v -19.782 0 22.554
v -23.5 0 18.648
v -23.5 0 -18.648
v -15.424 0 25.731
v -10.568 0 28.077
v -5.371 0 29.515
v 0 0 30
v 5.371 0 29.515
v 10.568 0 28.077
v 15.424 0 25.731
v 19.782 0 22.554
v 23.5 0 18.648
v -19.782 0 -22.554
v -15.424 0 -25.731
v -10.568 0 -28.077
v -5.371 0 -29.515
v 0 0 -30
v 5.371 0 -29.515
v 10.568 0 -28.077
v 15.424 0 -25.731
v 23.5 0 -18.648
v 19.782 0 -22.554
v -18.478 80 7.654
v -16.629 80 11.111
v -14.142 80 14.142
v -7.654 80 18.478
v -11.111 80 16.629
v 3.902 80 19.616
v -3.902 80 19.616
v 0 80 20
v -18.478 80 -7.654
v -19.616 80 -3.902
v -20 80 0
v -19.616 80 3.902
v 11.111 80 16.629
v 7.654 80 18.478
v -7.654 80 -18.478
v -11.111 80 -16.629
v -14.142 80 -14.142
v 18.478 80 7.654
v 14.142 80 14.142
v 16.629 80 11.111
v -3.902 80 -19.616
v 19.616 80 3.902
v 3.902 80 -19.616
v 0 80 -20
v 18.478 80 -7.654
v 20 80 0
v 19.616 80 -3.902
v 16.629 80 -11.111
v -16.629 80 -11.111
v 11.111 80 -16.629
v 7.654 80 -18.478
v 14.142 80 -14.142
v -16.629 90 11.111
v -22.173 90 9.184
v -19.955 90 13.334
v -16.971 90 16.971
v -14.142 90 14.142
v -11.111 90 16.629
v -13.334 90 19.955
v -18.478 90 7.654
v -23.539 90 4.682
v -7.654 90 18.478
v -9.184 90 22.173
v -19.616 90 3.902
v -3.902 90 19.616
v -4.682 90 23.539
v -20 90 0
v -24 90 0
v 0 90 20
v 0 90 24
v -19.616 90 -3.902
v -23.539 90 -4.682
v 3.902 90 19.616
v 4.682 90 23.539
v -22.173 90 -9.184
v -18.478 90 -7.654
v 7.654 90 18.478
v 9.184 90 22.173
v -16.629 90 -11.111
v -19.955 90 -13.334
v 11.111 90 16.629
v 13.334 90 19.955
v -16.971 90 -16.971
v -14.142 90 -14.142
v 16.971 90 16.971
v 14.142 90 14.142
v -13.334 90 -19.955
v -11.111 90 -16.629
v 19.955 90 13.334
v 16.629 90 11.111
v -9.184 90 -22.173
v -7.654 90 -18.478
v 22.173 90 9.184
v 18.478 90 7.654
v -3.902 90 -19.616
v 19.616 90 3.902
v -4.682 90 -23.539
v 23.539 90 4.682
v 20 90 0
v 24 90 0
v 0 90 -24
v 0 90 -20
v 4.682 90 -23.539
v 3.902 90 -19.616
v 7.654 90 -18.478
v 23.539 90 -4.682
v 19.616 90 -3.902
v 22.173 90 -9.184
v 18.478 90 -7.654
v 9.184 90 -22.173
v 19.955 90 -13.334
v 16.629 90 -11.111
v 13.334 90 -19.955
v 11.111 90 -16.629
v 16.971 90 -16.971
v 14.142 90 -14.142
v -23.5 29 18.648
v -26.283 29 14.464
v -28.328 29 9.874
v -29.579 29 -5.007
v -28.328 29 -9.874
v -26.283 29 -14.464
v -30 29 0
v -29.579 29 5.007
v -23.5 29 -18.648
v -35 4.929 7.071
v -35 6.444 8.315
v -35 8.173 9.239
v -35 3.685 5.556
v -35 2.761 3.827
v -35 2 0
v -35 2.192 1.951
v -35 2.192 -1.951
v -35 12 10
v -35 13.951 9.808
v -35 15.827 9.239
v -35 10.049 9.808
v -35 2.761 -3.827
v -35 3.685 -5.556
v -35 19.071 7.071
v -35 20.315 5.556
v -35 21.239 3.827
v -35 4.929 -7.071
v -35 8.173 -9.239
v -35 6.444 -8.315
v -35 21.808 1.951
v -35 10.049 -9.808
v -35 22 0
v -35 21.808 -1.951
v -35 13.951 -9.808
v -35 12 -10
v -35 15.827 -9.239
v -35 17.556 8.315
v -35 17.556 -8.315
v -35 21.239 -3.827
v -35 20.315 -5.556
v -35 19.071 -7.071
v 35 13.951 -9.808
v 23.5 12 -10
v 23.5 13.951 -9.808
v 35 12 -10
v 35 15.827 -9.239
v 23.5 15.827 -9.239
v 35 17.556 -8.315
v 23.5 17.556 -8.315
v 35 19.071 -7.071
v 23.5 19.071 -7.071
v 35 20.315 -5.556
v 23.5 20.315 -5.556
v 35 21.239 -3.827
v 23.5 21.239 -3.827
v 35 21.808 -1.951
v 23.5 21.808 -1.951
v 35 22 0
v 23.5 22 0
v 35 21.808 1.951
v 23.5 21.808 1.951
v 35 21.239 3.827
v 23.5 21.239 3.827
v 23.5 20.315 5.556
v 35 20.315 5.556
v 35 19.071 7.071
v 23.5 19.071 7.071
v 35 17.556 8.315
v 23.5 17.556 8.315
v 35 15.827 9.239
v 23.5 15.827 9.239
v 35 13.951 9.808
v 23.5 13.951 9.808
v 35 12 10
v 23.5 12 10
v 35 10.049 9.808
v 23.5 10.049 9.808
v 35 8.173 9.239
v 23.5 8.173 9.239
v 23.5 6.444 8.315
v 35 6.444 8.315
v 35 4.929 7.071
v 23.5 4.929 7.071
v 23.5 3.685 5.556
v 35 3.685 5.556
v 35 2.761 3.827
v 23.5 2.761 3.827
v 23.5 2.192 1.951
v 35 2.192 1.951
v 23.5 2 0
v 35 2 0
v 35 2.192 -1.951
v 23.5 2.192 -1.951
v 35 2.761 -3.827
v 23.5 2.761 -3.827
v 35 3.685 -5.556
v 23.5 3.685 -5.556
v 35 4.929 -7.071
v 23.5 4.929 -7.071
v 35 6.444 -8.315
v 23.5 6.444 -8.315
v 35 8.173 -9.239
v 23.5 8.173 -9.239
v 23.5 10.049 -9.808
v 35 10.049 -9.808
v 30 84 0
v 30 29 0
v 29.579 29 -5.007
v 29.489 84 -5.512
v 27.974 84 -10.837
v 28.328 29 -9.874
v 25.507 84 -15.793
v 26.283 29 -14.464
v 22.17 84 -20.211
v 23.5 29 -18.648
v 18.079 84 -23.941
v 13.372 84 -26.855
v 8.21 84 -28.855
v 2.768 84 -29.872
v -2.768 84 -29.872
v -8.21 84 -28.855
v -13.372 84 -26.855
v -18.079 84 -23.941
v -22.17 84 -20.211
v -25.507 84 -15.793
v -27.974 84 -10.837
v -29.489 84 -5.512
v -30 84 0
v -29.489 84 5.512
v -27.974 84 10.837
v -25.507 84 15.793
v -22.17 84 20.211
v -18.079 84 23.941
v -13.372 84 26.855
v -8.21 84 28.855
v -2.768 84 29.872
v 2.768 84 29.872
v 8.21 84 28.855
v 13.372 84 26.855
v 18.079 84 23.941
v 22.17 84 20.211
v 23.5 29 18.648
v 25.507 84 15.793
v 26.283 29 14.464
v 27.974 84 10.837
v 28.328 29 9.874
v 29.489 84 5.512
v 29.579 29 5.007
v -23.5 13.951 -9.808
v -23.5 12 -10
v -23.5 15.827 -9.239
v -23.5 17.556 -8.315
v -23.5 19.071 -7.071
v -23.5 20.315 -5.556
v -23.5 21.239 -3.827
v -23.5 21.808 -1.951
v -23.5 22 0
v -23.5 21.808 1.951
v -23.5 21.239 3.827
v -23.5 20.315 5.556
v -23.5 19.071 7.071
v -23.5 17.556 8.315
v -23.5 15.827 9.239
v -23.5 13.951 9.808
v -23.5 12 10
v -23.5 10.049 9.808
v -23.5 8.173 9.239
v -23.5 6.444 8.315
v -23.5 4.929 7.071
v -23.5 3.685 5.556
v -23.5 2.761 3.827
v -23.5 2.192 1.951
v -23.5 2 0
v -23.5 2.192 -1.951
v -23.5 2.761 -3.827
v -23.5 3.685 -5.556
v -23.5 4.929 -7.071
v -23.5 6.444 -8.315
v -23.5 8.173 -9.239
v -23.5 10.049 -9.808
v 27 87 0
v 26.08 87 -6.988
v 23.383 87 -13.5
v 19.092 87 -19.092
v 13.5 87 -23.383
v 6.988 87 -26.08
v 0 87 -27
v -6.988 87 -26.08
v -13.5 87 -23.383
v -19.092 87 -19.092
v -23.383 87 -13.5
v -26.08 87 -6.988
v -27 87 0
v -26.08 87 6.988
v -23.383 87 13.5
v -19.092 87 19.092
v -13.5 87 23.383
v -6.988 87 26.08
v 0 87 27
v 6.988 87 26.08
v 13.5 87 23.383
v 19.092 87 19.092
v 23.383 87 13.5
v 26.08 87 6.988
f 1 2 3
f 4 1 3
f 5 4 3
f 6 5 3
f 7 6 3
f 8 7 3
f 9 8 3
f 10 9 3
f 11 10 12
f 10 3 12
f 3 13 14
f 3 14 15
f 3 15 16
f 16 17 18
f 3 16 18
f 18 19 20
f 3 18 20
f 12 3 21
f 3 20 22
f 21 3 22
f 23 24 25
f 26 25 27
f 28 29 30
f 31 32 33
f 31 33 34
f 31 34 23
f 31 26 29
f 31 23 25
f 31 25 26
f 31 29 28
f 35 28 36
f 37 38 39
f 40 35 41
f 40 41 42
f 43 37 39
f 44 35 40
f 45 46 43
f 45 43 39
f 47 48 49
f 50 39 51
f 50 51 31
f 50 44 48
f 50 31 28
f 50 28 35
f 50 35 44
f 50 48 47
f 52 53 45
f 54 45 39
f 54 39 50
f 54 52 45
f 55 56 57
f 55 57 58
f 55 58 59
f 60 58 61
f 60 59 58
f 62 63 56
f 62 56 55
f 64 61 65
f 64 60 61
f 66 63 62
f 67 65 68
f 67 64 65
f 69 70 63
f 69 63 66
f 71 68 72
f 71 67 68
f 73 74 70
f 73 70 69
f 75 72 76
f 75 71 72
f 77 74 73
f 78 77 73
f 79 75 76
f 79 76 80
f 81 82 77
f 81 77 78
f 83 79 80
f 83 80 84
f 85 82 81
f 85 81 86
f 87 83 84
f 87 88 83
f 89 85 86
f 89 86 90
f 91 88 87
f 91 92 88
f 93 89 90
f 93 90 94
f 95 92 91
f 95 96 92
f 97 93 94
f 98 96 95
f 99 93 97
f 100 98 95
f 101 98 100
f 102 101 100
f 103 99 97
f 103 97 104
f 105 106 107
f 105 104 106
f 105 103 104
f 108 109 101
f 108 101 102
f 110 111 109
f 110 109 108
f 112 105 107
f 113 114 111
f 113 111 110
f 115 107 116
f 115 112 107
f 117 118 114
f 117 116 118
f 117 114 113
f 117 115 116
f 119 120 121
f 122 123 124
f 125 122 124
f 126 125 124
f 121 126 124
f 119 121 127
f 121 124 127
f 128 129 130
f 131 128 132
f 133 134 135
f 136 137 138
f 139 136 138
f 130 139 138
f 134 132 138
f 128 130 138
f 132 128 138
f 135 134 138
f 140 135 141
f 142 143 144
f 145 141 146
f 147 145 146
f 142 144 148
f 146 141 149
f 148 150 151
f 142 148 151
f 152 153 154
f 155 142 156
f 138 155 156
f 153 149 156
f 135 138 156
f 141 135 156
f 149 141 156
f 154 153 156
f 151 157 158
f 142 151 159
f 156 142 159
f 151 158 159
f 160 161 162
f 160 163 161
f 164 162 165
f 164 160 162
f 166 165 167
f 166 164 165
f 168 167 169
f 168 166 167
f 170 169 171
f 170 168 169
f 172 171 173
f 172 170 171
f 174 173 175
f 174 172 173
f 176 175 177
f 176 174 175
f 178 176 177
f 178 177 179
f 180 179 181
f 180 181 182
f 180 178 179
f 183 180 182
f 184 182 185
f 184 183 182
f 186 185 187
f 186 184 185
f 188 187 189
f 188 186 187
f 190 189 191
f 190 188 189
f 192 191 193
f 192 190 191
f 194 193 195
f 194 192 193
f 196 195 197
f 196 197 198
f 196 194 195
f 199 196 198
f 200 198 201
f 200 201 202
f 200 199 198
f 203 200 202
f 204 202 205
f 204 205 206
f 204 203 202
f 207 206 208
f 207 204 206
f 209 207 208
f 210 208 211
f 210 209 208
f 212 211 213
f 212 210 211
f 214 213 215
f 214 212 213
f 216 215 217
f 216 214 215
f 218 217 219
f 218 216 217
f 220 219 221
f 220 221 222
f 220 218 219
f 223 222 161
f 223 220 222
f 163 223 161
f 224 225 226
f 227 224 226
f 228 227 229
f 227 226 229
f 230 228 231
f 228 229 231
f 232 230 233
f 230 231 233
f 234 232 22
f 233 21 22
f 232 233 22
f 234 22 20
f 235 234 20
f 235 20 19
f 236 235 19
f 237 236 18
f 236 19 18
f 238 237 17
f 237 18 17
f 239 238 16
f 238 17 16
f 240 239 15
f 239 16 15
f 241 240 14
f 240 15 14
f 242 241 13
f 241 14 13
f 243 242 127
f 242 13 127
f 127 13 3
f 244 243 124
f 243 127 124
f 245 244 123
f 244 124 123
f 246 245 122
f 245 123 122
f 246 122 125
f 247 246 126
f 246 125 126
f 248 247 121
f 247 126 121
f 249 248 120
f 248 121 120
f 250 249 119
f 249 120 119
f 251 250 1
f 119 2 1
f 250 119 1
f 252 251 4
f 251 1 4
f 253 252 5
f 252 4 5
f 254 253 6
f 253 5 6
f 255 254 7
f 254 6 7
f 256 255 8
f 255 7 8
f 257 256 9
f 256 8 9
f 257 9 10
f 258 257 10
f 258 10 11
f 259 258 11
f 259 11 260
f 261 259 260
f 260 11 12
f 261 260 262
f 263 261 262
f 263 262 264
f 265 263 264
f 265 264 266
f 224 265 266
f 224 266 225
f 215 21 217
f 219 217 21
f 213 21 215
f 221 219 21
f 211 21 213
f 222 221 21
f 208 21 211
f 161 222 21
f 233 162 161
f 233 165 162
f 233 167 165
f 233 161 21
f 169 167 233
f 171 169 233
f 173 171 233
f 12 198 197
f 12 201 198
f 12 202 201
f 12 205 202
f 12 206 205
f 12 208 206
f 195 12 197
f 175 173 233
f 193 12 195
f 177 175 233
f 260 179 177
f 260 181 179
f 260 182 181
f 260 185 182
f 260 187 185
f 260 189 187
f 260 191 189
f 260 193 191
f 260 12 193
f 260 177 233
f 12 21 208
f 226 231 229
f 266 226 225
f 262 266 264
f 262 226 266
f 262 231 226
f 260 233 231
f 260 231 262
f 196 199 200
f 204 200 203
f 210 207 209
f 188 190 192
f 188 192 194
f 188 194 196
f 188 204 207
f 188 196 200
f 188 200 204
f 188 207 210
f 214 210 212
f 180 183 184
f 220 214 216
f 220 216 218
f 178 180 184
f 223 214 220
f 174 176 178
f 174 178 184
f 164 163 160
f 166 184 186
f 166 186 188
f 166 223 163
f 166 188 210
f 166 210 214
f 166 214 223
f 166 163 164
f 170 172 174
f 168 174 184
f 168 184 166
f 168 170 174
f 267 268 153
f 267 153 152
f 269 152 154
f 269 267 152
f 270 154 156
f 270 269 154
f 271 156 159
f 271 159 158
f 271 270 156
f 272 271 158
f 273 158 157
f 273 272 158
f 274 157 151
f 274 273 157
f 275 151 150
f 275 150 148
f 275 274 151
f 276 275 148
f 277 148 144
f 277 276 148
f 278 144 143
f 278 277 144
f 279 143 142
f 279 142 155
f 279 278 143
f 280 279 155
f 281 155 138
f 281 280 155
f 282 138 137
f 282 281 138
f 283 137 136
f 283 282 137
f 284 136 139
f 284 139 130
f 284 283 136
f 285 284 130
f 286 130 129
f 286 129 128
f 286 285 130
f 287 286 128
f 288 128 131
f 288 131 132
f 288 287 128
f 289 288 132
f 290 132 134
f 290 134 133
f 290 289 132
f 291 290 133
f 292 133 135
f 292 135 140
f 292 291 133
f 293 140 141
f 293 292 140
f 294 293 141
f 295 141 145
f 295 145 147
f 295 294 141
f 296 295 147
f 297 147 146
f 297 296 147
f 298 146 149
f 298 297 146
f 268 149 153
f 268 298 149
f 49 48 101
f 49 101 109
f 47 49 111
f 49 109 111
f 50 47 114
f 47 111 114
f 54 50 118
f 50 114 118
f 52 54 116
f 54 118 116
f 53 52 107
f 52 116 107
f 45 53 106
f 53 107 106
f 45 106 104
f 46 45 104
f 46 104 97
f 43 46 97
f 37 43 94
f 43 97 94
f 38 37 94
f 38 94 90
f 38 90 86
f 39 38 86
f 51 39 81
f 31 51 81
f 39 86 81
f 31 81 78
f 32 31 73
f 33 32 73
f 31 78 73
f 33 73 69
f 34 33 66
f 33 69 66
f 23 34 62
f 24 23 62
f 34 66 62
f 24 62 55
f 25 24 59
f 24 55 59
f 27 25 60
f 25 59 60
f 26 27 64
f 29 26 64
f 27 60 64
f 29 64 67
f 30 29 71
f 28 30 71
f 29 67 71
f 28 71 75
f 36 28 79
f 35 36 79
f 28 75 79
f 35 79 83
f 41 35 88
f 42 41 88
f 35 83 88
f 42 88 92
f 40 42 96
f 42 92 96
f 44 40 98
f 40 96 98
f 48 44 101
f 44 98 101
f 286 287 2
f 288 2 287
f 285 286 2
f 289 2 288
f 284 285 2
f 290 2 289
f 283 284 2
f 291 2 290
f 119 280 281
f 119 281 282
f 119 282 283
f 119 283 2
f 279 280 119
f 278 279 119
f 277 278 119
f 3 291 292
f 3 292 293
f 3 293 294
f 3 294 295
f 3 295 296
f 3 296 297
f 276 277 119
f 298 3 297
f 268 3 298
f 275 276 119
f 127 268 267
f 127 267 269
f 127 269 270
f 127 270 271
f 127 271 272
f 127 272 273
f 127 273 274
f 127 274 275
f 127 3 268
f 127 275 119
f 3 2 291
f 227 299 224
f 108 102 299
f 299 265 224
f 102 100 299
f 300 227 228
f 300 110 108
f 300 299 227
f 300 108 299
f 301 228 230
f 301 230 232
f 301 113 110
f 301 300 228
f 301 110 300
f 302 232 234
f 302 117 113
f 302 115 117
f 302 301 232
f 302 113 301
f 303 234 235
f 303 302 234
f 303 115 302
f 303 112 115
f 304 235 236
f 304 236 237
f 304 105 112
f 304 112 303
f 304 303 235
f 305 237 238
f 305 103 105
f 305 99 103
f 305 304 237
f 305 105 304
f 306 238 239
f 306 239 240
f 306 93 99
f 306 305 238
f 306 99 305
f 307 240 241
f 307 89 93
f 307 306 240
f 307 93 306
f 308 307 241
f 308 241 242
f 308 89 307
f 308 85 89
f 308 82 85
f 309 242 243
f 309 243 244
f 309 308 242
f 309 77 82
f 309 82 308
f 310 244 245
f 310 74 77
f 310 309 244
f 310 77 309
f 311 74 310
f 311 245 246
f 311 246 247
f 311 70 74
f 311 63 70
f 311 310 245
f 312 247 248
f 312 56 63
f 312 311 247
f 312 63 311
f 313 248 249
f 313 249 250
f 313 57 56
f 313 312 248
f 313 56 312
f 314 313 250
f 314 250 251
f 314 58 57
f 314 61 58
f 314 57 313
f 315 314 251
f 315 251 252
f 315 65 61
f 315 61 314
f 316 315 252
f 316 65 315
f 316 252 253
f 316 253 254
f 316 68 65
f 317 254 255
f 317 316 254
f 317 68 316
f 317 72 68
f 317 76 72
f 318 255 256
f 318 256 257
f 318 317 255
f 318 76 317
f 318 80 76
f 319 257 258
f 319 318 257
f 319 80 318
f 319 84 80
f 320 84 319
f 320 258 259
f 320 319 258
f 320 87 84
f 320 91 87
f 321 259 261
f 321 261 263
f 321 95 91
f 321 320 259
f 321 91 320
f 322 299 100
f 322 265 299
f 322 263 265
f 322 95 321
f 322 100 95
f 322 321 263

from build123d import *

# Parameters (mm, degrees)
SKETCH1_R           = 30
BOSS_EXTRUDE1_DEPTH = 90
SKETCH8_W           = 6.5
SKETCH8_H           = 29
CUT_EXTRUDE5_DEPTH  = 20
SKETCH5_R           = 10
BOSS_EXTRUDE3_DEPTH = 35
SKETCH7_R           = 20
CUT_EXTRUDE4_DEPTH  = 10
CHAMFER1_SIZE       = 6


with BuildPart() as part:
    # Sketch1 → Boss-Extrude1 (new body)
    with BuildSketch(Plane(origin=(0, 0, 0), x_dir=(1, 0, 0), z_dir=(0, 1, 0))):
        Circle(SKETCH1_R)
    extrude(amount=BOSS_EXTRUDE1_DEPTH)

    # Sketch8 → Cut-Extrude5 (cut, symmetric)
    with BuildSketch(Plane.XY):
        with Locations((-26.75, 14.5)):
            Rectangle(SKETCH8_W, SKETCH8_H)
        with Locations((26.75, 14.5)):
            Rectangle(SKETCH8_W, SKETCH8_H)
    extrude(amount=CUT_EXTRUDE5_DEPTH, both=True, mode=Mode.SUBTRACT)

    # Sketch5 → Boss-Extrude3 (add, symmetric)
    with BuildSketch(Plane(origin=(0, 0, 0), x_dir=(0, 0, -1), z_dir=(1, 0, 0))):
        with Locations((0, 12)):
            Circle(SKETCH5_R)
    extrude(amount=BOSS_EXTRUDE3_DEPTH, both=True)

    # Sketch7 → Cut-Extrude4 (cut)
    with BuildSketch(Plane(origin=(0, 90, 0), x_dir=(1, 0, 0), z_dir=(0, 1, 0))):
        Circle(SKETCH7_R)
    extrude(amount=-CUT_EXTRUDE4_DEPTH, mode=Mode.SUBTRACT)

    # Chamfer1
    chamfer1_edges = [part.edges().sort_by_distance(p)[0] for p in [
        (-30, 90, 0),
    ]]
    chamfer(chamfer1_edges, length=CHAMFER1_SIZE)


solid = part.part
